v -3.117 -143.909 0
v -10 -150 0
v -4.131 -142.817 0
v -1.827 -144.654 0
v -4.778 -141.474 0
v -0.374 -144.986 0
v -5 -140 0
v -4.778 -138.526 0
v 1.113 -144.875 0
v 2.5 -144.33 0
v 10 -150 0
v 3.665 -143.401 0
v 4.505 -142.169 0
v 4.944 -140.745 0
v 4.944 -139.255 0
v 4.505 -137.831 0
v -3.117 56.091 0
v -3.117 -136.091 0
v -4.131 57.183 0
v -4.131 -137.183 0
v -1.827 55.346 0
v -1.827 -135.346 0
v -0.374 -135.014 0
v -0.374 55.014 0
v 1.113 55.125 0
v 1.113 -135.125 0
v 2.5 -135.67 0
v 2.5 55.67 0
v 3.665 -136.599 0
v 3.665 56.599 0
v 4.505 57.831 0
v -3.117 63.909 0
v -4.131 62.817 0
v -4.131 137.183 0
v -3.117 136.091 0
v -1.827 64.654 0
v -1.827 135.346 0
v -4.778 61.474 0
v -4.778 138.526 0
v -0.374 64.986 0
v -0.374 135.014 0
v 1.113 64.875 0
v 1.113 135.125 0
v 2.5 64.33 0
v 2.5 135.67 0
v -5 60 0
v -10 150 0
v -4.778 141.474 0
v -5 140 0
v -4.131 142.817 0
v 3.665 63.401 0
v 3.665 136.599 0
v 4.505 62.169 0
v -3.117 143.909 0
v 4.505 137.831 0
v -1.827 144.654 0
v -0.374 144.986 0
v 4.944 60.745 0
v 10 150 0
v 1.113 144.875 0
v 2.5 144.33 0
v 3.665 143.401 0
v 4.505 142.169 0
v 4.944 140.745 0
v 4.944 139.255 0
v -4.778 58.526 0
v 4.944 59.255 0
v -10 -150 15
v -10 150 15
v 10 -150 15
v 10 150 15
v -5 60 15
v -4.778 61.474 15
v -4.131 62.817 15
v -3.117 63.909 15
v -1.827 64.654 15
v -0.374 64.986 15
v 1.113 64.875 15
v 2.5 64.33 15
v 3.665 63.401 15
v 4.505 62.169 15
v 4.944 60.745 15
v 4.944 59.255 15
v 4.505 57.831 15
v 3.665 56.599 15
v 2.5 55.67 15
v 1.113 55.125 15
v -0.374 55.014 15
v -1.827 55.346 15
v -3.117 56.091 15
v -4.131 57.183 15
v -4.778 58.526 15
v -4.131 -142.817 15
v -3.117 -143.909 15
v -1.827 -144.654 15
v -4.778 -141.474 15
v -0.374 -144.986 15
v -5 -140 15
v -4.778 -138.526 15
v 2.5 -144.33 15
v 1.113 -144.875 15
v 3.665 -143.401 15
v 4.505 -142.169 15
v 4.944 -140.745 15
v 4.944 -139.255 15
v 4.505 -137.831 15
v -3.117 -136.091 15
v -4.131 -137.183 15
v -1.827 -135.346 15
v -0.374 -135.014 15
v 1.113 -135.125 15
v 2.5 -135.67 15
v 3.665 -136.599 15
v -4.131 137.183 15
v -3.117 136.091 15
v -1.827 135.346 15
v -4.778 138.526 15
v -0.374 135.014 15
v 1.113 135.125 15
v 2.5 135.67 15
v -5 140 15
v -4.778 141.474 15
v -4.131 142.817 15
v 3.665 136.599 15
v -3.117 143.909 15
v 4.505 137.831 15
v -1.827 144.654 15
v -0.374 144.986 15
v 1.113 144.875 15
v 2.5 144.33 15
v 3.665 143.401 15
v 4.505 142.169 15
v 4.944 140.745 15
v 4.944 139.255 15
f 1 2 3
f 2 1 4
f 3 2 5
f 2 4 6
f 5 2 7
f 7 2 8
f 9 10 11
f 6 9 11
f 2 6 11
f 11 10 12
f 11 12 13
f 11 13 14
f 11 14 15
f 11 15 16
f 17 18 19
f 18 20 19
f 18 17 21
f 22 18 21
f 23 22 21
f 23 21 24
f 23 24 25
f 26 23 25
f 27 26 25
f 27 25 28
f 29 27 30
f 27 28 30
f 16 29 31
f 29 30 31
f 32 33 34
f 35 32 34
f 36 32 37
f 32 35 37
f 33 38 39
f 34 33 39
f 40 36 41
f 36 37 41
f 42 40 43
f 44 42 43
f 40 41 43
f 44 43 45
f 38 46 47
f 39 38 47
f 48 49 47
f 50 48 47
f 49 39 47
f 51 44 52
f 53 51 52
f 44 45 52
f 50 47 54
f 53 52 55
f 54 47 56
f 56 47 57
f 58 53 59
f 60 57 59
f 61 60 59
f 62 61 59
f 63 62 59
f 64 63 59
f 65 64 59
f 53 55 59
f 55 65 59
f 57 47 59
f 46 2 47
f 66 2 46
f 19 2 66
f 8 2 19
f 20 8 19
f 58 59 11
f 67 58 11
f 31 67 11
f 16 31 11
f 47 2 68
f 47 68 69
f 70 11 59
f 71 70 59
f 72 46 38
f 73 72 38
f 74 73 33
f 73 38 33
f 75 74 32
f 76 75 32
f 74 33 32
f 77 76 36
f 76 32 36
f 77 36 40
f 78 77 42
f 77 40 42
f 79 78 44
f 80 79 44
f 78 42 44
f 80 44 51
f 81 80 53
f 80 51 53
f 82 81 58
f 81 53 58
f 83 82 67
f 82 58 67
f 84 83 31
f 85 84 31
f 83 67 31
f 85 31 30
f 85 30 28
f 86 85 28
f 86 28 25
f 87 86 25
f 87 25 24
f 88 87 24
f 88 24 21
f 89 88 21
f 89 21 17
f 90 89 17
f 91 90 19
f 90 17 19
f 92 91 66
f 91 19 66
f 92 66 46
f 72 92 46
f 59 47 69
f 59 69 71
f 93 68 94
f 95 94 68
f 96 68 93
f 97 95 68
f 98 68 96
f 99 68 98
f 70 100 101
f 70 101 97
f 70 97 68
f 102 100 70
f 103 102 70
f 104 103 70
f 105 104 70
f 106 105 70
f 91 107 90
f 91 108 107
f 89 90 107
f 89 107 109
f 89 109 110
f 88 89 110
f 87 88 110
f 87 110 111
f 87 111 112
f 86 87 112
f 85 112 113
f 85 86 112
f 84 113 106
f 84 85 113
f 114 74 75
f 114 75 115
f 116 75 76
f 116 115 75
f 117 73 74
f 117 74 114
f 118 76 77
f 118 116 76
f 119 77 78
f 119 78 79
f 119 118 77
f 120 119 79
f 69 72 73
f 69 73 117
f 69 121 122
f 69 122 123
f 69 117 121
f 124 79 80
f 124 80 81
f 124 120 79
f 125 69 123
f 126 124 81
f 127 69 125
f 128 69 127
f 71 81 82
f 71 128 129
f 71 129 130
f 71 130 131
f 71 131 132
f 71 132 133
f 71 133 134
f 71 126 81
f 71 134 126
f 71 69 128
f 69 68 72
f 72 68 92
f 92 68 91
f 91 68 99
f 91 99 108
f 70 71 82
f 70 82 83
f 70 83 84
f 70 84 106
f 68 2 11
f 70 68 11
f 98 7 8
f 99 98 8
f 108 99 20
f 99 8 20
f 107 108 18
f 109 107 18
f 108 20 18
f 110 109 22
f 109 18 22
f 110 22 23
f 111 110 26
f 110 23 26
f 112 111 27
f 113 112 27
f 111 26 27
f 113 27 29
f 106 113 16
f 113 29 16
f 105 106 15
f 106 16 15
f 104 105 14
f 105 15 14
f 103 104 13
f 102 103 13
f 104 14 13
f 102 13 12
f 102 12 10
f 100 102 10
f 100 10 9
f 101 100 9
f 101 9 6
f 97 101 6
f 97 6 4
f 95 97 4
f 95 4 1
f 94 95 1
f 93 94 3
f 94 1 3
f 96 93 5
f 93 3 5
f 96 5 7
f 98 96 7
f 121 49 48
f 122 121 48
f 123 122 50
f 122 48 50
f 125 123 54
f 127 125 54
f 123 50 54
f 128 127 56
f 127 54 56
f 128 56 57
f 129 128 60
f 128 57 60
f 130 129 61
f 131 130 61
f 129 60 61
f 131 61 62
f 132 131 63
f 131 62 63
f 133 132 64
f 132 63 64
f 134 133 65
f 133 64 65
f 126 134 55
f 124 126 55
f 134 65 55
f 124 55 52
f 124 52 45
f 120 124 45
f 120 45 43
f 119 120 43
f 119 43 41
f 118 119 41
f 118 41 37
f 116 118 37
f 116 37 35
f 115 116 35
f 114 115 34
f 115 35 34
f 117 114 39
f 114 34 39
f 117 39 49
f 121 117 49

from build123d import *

# Parameters (mm, degrees)
SKETCH1_W           = 20
SKETCH1_H           = 300
BOSS_EXTRUDE1_DEPTH = 15
SKETCH3_R           = 5
CUT_EXTRUDE1_DEPTH  = 15


with BuildPart() as part:
    # Sketch1 → Boss-Extrude1 (new body)
    with BuildSketch(Plane.XY):
        Rectangle(SKETCH1_W, SKETCH1_H)
    extrude(amount=BOSS_EXTRUDE1_DEPTH)

    # Sketch3 → Cut-Extrude1 (cut)
    with BuildSketch(Plane(origin=(0, 0, 0), x_dir=(-1, 0, 0), z_dir=(0, 0, -1))):
        with Locations((0, -140)):
            Circle(SKETCH3_R)
        with Locations((0, 140)):
            Circle(SKETCH3_R)
        with Locations((0, 60)):
            Circle(SKETCH3_R)
    extrude(amount=-CUT_EXTRUDE1_DEPTH, mode=Mode.SUBTRACT)


solid = part.part
